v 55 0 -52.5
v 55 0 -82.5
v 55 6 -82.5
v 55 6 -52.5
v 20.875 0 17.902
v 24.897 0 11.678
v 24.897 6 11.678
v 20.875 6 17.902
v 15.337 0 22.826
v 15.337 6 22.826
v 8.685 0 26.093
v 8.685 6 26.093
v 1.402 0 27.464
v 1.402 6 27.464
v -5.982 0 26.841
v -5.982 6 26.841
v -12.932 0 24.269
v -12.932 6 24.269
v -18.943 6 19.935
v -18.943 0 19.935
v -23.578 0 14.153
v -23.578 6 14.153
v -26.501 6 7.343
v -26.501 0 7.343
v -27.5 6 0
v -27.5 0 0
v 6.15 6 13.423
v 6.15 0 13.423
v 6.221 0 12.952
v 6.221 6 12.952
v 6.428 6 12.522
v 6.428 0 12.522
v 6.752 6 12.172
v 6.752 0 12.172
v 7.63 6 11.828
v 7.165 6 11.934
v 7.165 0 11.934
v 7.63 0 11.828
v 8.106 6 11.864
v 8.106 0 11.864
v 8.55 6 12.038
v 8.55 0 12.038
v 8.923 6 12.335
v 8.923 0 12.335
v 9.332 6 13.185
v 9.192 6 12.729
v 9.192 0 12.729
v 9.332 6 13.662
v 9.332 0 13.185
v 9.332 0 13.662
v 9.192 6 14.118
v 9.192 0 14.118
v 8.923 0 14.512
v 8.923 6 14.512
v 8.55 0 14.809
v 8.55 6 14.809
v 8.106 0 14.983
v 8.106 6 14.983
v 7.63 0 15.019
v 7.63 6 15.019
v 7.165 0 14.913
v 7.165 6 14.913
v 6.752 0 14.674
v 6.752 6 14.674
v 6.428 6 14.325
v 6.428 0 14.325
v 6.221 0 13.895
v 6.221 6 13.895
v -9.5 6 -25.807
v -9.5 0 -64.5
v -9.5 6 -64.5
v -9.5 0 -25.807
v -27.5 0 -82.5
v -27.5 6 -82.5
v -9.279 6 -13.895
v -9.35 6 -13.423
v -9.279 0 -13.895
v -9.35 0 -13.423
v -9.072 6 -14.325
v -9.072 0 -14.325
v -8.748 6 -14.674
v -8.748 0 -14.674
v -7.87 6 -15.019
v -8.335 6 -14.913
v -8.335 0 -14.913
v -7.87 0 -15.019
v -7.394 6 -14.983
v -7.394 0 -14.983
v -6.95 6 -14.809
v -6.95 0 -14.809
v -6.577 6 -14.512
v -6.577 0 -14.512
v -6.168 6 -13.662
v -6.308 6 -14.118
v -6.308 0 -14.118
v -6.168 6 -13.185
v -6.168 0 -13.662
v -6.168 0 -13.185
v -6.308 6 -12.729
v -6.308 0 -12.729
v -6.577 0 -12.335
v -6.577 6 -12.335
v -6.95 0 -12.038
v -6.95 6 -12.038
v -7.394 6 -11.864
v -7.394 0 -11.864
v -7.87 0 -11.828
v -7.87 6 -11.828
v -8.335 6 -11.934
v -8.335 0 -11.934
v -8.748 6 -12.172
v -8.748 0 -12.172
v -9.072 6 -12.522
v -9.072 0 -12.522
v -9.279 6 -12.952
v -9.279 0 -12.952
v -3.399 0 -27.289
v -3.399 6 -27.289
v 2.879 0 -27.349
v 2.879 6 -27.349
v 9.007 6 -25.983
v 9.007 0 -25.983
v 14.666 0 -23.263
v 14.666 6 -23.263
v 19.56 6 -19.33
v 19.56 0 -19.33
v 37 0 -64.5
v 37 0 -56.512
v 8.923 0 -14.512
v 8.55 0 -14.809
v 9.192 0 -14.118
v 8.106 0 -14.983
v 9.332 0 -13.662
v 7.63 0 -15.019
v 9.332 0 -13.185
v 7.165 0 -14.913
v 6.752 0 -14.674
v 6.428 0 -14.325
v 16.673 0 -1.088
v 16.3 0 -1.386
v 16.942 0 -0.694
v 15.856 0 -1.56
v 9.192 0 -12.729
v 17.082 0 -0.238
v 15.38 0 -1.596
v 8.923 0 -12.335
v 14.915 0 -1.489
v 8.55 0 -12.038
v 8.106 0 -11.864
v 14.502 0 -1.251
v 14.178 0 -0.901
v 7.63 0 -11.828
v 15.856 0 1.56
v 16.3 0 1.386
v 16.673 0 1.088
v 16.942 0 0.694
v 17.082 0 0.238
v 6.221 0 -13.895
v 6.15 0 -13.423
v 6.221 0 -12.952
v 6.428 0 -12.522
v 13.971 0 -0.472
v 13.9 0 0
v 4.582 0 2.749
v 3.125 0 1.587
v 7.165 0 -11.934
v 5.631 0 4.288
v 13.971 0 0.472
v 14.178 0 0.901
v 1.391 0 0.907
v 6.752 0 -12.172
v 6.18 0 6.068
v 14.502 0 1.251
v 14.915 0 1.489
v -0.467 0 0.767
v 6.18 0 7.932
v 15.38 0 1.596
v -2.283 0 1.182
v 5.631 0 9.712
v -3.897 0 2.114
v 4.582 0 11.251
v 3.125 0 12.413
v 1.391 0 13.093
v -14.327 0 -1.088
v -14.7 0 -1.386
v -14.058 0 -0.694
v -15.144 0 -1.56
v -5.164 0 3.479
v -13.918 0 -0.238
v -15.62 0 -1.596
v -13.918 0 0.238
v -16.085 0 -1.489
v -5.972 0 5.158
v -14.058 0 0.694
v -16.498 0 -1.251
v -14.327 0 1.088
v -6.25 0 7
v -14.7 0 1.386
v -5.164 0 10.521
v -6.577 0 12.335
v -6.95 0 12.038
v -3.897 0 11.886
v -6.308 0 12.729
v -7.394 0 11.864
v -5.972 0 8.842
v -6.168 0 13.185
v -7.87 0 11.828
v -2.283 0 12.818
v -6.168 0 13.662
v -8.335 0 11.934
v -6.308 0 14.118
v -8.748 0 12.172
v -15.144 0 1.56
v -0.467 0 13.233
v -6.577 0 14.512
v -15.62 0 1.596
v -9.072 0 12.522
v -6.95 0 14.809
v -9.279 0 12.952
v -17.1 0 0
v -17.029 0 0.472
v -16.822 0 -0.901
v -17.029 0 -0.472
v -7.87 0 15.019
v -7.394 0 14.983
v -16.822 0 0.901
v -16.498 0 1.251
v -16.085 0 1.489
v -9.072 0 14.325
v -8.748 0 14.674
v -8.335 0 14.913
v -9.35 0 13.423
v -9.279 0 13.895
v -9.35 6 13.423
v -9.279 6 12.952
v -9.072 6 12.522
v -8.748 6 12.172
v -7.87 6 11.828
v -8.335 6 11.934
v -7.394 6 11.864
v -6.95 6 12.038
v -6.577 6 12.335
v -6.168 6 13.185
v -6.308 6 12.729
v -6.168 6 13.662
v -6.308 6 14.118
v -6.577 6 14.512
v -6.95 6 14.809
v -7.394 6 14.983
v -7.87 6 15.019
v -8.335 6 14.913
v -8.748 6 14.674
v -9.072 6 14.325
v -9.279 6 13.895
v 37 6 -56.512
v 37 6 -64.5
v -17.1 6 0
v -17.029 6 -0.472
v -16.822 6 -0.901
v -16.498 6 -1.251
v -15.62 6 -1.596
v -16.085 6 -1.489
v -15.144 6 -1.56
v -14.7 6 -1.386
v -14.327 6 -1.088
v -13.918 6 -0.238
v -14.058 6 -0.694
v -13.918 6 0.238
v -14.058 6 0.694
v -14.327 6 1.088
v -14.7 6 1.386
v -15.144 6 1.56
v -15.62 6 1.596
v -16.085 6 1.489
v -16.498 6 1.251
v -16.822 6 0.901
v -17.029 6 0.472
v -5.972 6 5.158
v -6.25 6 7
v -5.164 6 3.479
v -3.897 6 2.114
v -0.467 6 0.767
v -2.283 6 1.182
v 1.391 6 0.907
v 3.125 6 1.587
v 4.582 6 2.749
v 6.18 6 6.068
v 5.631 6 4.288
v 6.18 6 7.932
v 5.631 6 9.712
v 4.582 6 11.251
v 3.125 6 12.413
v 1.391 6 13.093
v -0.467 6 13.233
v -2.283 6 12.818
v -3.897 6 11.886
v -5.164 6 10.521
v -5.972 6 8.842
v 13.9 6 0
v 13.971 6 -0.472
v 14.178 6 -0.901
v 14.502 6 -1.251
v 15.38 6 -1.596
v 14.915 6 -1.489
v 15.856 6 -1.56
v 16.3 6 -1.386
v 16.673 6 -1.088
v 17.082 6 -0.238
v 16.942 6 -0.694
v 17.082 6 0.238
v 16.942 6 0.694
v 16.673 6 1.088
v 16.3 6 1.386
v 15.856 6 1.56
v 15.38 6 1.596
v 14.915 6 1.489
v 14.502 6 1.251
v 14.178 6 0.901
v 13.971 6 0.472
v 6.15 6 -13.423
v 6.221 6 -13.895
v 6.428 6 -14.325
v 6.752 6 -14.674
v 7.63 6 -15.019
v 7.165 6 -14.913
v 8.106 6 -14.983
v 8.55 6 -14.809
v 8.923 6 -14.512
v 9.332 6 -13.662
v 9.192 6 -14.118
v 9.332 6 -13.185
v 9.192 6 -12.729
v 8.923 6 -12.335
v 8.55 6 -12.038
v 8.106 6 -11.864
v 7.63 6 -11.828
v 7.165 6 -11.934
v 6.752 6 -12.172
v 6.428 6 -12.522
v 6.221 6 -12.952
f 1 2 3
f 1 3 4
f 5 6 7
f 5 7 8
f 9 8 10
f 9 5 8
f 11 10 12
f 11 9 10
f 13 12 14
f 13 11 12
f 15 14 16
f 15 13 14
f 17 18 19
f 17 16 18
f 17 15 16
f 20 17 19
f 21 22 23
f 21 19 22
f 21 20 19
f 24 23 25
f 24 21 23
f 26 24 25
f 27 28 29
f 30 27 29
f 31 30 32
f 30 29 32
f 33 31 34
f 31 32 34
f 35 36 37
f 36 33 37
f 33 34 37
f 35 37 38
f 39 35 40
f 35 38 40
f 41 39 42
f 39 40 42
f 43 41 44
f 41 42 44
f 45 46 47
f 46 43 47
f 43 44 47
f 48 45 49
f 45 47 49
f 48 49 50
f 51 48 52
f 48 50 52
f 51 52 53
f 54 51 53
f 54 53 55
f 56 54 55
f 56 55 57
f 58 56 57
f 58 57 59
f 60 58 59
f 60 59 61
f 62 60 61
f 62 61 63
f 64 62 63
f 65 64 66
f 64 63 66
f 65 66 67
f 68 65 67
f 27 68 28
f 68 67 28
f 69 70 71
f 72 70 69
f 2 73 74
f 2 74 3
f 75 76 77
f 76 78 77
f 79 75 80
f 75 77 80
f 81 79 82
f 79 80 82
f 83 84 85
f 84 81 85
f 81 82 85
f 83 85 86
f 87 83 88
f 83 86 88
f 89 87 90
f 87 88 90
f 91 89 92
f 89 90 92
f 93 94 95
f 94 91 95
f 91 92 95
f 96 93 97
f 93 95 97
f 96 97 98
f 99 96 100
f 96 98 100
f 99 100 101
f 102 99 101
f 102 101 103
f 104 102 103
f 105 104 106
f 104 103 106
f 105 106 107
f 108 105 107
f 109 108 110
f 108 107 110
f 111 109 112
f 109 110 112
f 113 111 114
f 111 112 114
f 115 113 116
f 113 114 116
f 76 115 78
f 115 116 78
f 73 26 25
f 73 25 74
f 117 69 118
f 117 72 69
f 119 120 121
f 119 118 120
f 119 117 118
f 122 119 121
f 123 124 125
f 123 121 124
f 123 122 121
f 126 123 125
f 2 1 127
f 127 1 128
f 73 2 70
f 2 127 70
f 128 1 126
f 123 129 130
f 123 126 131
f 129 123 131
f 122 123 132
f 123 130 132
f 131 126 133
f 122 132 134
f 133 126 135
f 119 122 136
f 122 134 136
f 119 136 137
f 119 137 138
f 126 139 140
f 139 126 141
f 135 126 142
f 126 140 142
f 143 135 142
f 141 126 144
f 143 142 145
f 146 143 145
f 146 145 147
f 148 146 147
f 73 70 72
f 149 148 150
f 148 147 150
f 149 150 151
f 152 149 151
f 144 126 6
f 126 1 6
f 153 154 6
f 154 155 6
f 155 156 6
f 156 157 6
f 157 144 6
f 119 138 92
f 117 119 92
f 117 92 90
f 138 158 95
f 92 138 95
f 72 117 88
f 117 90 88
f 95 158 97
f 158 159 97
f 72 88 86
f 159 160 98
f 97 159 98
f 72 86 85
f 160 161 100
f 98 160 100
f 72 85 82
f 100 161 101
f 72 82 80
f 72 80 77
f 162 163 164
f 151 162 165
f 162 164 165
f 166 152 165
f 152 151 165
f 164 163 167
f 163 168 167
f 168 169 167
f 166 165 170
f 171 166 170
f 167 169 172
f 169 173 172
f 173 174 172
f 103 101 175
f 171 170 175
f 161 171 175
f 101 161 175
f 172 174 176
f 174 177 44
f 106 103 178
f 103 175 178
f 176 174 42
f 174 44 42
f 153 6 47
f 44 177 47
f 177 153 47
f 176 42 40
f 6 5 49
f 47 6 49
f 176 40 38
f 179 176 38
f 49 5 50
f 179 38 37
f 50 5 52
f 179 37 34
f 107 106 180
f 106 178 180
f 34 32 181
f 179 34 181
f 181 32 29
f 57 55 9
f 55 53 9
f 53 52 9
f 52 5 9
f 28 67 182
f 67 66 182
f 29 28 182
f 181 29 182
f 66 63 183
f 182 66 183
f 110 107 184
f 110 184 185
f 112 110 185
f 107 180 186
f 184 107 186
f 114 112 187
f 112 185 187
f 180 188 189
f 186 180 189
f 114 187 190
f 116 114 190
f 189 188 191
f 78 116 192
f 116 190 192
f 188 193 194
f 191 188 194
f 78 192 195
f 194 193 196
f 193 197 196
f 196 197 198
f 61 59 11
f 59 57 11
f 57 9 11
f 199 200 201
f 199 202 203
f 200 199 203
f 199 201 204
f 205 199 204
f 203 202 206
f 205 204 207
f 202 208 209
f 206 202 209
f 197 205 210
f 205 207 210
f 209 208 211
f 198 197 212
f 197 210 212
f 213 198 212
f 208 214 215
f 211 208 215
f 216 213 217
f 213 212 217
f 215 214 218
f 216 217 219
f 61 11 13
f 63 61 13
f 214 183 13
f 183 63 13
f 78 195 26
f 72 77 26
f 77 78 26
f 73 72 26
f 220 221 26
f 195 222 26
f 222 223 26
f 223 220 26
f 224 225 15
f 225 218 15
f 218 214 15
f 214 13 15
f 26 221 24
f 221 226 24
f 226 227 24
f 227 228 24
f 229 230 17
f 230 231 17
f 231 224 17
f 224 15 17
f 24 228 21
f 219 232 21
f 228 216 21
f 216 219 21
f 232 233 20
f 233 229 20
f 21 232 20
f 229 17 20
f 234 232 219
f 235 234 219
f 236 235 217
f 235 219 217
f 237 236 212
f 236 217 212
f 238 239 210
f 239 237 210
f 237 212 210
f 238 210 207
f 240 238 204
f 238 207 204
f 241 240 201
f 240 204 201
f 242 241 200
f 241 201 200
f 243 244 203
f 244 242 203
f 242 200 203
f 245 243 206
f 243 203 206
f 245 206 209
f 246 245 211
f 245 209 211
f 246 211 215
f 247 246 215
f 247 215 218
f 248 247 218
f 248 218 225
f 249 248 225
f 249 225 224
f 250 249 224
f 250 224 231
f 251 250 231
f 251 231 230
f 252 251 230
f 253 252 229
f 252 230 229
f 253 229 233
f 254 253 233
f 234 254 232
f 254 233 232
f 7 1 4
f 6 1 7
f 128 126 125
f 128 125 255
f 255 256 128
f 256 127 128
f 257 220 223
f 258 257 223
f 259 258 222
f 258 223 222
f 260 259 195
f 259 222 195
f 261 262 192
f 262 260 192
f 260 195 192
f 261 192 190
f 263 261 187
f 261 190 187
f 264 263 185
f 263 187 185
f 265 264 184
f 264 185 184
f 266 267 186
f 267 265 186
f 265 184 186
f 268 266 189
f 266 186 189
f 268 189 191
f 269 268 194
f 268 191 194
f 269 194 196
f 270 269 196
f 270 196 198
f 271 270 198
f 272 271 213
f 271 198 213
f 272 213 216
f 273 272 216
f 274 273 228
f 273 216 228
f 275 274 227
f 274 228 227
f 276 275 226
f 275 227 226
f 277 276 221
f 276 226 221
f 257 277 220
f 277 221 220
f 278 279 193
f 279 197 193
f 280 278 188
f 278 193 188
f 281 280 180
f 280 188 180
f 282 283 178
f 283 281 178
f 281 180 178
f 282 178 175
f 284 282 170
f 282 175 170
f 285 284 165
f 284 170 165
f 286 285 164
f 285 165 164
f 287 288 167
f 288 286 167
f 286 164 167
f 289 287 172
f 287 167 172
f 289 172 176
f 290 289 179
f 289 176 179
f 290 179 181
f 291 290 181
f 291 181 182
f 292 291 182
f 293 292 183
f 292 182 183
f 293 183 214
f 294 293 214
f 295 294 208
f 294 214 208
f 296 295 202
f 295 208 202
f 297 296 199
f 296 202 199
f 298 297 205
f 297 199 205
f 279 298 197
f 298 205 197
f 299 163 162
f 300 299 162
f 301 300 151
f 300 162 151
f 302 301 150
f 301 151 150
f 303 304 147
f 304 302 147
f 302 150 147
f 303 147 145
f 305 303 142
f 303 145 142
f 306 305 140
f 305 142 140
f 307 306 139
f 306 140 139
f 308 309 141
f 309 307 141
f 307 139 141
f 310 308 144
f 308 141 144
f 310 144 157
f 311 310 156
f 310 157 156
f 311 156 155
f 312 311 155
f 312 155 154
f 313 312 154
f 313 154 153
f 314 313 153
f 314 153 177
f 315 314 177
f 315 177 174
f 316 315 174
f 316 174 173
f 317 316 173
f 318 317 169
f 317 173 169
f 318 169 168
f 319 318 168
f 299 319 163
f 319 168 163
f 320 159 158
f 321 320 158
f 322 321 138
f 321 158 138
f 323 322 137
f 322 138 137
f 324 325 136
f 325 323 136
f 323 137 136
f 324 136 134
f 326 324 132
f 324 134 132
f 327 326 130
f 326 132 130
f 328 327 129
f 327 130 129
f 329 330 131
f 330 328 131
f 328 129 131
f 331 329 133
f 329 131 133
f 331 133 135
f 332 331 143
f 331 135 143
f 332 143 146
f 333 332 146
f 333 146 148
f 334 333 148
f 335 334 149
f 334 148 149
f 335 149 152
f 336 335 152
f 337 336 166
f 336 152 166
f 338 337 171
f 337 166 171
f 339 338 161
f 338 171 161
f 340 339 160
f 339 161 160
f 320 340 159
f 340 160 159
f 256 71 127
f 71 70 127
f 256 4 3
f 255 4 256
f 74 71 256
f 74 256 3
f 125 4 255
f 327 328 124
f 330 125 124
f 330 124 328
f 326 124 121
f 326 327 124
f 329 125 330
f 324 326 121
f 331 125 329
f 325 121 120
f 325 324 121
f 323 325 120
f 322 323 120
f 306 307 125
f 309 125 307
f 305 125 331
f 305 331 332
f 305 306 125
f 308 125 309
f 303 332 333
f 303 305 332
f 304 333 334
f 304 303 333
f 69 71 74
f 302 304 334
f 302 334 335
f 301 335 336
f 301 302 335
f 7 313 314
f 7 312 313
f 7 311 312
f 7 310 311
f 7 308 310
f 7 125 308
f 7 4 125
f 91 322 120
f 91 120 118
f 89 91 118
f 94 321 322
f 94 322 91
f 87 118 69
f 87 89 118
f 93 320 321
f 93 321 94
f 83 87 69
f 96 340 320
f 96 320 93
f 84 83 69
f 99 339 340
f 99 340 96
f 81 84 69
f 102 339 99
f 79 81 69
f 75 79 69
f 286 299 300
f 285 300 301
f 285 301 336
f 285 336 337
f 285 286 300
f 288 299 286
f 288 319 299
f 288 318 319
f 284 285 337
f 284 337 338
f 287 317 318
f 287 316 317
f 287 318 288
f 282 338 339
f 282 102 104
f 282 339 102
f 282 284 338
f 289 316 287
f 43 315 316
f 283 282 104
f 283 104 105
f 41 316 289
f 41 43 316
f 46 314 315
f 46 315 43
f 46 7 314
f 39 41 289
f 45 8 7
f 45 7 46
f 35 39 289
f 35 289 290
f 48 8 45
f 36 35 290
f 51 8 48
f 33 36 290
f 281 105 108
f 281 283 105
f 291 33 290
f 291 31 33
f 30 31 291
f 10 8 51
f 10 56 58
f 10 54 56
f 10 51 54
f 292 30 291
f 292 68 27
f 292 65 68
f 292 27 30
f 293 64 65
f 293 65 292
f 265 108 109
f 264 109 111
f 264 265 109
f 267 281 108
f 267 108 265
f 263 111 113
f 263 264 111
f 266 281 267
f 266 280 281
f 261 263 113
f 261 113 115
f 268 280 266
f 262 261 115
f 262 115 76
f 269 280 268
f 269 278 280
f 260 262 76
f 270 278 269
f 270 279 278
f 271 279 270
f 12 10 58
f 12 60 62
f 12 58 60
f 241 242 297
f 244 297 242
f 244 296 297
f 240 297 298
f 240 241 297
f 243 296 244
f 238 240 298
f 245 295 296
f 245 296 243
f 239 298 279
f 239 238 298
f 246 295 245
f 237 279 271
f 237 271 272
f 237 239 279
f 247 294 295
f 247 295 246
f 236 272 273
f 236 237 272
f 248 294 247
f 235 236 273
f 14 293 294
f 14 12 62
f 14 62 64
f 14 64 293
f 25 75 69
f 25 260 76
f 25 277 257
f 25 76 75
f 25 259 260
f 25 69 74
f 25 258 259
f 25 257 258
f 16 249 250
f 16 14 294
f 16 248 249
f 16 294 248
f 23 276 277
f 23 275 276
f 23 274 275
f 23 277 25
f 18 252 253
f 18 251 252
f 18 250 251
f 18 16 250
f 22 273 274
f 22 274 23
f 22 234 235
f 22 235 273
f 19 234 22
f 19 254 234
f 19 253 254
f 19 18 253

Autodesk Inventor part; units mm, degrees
ref_plane "YZ Plane" through (0, 0, 0) normal (1, 0, 0) x (0, 1, 0)
ref_plane "XZ Plane" through (0, 0, 0) normal (0, 1, 0) x (-1, 0, 0)
ref_plane "XY Plane" through (0, 0, 0) normal (0, 0, 1) x (1, 0, 0)
sketch "Sketch1" plane through (0, 0, 0) normal (0, 1, 0) x (-1, 0, 0)
  line L0 (-55, -52.5) -> (-24.8972, 11.6781)
  line L1 (-55, -82.5) -> (-55, -52.5)
  line L2 (27.5, 0) -> (27.5, -82.5)
  line L3 (9.5, -64.5) -> (-37, -64.5)
  line L4 (9.5, -64.5) -> (9.5, -25.807)
  line L5 (-37, -64.5) -> (-37, -56.5118)
  arc A0 (27.5, 0) -> (-24.8972, 11.6781) centre (0, 0) ccw
  arc A1 (-19.56, -19.3302) -> (9.5, -25.807) centre (0, 0) ccw
  circle A2 centre (0, 7) radius 6.25
  circle A3 centre (15.5, 0) radius 1.6
  circle A4 centre (7.75, 13.4234) radius 1.6
  circle A5 centre (-7.75, 13.4234) radius 1.6
  circle A6 centre (-15.5, 0) radius 1.6
  circle A7 centre (-7.75, -13.4234) radius 1.6
  circle A8 centre (7.75, -13.4234) radius 1.6
  line L6 (-19.56, -19.3302) -> (-37, -56.5118)
  line L7 (27.5, -82.5) -> (-55, -82.5)
  dimension "d12" = 18
  dimension "d13" = 82.5
  dimension "d14" = 12.5
  dimension "d15" = 7
  dimension "d16" = 3.2
  dimension "d17" = 15.5
  dimension "d20" = 360
  dimension "d22" = 30
  dimension "d23" = 27.5
  dimension "d24" = 18
  dimension "d25" = 27.5
  dimension "d26" = 27.5
  dimension "d27" = 27.5
  dimension "d29" = 18
  dimension "d30" = 18
  dimension "d31" = 82.5
  dimension "d32" = 82.5
extrude "Extrusion1" add sketch "Sketch1" along normal blind 6
properties part number "chassi_front_template"
